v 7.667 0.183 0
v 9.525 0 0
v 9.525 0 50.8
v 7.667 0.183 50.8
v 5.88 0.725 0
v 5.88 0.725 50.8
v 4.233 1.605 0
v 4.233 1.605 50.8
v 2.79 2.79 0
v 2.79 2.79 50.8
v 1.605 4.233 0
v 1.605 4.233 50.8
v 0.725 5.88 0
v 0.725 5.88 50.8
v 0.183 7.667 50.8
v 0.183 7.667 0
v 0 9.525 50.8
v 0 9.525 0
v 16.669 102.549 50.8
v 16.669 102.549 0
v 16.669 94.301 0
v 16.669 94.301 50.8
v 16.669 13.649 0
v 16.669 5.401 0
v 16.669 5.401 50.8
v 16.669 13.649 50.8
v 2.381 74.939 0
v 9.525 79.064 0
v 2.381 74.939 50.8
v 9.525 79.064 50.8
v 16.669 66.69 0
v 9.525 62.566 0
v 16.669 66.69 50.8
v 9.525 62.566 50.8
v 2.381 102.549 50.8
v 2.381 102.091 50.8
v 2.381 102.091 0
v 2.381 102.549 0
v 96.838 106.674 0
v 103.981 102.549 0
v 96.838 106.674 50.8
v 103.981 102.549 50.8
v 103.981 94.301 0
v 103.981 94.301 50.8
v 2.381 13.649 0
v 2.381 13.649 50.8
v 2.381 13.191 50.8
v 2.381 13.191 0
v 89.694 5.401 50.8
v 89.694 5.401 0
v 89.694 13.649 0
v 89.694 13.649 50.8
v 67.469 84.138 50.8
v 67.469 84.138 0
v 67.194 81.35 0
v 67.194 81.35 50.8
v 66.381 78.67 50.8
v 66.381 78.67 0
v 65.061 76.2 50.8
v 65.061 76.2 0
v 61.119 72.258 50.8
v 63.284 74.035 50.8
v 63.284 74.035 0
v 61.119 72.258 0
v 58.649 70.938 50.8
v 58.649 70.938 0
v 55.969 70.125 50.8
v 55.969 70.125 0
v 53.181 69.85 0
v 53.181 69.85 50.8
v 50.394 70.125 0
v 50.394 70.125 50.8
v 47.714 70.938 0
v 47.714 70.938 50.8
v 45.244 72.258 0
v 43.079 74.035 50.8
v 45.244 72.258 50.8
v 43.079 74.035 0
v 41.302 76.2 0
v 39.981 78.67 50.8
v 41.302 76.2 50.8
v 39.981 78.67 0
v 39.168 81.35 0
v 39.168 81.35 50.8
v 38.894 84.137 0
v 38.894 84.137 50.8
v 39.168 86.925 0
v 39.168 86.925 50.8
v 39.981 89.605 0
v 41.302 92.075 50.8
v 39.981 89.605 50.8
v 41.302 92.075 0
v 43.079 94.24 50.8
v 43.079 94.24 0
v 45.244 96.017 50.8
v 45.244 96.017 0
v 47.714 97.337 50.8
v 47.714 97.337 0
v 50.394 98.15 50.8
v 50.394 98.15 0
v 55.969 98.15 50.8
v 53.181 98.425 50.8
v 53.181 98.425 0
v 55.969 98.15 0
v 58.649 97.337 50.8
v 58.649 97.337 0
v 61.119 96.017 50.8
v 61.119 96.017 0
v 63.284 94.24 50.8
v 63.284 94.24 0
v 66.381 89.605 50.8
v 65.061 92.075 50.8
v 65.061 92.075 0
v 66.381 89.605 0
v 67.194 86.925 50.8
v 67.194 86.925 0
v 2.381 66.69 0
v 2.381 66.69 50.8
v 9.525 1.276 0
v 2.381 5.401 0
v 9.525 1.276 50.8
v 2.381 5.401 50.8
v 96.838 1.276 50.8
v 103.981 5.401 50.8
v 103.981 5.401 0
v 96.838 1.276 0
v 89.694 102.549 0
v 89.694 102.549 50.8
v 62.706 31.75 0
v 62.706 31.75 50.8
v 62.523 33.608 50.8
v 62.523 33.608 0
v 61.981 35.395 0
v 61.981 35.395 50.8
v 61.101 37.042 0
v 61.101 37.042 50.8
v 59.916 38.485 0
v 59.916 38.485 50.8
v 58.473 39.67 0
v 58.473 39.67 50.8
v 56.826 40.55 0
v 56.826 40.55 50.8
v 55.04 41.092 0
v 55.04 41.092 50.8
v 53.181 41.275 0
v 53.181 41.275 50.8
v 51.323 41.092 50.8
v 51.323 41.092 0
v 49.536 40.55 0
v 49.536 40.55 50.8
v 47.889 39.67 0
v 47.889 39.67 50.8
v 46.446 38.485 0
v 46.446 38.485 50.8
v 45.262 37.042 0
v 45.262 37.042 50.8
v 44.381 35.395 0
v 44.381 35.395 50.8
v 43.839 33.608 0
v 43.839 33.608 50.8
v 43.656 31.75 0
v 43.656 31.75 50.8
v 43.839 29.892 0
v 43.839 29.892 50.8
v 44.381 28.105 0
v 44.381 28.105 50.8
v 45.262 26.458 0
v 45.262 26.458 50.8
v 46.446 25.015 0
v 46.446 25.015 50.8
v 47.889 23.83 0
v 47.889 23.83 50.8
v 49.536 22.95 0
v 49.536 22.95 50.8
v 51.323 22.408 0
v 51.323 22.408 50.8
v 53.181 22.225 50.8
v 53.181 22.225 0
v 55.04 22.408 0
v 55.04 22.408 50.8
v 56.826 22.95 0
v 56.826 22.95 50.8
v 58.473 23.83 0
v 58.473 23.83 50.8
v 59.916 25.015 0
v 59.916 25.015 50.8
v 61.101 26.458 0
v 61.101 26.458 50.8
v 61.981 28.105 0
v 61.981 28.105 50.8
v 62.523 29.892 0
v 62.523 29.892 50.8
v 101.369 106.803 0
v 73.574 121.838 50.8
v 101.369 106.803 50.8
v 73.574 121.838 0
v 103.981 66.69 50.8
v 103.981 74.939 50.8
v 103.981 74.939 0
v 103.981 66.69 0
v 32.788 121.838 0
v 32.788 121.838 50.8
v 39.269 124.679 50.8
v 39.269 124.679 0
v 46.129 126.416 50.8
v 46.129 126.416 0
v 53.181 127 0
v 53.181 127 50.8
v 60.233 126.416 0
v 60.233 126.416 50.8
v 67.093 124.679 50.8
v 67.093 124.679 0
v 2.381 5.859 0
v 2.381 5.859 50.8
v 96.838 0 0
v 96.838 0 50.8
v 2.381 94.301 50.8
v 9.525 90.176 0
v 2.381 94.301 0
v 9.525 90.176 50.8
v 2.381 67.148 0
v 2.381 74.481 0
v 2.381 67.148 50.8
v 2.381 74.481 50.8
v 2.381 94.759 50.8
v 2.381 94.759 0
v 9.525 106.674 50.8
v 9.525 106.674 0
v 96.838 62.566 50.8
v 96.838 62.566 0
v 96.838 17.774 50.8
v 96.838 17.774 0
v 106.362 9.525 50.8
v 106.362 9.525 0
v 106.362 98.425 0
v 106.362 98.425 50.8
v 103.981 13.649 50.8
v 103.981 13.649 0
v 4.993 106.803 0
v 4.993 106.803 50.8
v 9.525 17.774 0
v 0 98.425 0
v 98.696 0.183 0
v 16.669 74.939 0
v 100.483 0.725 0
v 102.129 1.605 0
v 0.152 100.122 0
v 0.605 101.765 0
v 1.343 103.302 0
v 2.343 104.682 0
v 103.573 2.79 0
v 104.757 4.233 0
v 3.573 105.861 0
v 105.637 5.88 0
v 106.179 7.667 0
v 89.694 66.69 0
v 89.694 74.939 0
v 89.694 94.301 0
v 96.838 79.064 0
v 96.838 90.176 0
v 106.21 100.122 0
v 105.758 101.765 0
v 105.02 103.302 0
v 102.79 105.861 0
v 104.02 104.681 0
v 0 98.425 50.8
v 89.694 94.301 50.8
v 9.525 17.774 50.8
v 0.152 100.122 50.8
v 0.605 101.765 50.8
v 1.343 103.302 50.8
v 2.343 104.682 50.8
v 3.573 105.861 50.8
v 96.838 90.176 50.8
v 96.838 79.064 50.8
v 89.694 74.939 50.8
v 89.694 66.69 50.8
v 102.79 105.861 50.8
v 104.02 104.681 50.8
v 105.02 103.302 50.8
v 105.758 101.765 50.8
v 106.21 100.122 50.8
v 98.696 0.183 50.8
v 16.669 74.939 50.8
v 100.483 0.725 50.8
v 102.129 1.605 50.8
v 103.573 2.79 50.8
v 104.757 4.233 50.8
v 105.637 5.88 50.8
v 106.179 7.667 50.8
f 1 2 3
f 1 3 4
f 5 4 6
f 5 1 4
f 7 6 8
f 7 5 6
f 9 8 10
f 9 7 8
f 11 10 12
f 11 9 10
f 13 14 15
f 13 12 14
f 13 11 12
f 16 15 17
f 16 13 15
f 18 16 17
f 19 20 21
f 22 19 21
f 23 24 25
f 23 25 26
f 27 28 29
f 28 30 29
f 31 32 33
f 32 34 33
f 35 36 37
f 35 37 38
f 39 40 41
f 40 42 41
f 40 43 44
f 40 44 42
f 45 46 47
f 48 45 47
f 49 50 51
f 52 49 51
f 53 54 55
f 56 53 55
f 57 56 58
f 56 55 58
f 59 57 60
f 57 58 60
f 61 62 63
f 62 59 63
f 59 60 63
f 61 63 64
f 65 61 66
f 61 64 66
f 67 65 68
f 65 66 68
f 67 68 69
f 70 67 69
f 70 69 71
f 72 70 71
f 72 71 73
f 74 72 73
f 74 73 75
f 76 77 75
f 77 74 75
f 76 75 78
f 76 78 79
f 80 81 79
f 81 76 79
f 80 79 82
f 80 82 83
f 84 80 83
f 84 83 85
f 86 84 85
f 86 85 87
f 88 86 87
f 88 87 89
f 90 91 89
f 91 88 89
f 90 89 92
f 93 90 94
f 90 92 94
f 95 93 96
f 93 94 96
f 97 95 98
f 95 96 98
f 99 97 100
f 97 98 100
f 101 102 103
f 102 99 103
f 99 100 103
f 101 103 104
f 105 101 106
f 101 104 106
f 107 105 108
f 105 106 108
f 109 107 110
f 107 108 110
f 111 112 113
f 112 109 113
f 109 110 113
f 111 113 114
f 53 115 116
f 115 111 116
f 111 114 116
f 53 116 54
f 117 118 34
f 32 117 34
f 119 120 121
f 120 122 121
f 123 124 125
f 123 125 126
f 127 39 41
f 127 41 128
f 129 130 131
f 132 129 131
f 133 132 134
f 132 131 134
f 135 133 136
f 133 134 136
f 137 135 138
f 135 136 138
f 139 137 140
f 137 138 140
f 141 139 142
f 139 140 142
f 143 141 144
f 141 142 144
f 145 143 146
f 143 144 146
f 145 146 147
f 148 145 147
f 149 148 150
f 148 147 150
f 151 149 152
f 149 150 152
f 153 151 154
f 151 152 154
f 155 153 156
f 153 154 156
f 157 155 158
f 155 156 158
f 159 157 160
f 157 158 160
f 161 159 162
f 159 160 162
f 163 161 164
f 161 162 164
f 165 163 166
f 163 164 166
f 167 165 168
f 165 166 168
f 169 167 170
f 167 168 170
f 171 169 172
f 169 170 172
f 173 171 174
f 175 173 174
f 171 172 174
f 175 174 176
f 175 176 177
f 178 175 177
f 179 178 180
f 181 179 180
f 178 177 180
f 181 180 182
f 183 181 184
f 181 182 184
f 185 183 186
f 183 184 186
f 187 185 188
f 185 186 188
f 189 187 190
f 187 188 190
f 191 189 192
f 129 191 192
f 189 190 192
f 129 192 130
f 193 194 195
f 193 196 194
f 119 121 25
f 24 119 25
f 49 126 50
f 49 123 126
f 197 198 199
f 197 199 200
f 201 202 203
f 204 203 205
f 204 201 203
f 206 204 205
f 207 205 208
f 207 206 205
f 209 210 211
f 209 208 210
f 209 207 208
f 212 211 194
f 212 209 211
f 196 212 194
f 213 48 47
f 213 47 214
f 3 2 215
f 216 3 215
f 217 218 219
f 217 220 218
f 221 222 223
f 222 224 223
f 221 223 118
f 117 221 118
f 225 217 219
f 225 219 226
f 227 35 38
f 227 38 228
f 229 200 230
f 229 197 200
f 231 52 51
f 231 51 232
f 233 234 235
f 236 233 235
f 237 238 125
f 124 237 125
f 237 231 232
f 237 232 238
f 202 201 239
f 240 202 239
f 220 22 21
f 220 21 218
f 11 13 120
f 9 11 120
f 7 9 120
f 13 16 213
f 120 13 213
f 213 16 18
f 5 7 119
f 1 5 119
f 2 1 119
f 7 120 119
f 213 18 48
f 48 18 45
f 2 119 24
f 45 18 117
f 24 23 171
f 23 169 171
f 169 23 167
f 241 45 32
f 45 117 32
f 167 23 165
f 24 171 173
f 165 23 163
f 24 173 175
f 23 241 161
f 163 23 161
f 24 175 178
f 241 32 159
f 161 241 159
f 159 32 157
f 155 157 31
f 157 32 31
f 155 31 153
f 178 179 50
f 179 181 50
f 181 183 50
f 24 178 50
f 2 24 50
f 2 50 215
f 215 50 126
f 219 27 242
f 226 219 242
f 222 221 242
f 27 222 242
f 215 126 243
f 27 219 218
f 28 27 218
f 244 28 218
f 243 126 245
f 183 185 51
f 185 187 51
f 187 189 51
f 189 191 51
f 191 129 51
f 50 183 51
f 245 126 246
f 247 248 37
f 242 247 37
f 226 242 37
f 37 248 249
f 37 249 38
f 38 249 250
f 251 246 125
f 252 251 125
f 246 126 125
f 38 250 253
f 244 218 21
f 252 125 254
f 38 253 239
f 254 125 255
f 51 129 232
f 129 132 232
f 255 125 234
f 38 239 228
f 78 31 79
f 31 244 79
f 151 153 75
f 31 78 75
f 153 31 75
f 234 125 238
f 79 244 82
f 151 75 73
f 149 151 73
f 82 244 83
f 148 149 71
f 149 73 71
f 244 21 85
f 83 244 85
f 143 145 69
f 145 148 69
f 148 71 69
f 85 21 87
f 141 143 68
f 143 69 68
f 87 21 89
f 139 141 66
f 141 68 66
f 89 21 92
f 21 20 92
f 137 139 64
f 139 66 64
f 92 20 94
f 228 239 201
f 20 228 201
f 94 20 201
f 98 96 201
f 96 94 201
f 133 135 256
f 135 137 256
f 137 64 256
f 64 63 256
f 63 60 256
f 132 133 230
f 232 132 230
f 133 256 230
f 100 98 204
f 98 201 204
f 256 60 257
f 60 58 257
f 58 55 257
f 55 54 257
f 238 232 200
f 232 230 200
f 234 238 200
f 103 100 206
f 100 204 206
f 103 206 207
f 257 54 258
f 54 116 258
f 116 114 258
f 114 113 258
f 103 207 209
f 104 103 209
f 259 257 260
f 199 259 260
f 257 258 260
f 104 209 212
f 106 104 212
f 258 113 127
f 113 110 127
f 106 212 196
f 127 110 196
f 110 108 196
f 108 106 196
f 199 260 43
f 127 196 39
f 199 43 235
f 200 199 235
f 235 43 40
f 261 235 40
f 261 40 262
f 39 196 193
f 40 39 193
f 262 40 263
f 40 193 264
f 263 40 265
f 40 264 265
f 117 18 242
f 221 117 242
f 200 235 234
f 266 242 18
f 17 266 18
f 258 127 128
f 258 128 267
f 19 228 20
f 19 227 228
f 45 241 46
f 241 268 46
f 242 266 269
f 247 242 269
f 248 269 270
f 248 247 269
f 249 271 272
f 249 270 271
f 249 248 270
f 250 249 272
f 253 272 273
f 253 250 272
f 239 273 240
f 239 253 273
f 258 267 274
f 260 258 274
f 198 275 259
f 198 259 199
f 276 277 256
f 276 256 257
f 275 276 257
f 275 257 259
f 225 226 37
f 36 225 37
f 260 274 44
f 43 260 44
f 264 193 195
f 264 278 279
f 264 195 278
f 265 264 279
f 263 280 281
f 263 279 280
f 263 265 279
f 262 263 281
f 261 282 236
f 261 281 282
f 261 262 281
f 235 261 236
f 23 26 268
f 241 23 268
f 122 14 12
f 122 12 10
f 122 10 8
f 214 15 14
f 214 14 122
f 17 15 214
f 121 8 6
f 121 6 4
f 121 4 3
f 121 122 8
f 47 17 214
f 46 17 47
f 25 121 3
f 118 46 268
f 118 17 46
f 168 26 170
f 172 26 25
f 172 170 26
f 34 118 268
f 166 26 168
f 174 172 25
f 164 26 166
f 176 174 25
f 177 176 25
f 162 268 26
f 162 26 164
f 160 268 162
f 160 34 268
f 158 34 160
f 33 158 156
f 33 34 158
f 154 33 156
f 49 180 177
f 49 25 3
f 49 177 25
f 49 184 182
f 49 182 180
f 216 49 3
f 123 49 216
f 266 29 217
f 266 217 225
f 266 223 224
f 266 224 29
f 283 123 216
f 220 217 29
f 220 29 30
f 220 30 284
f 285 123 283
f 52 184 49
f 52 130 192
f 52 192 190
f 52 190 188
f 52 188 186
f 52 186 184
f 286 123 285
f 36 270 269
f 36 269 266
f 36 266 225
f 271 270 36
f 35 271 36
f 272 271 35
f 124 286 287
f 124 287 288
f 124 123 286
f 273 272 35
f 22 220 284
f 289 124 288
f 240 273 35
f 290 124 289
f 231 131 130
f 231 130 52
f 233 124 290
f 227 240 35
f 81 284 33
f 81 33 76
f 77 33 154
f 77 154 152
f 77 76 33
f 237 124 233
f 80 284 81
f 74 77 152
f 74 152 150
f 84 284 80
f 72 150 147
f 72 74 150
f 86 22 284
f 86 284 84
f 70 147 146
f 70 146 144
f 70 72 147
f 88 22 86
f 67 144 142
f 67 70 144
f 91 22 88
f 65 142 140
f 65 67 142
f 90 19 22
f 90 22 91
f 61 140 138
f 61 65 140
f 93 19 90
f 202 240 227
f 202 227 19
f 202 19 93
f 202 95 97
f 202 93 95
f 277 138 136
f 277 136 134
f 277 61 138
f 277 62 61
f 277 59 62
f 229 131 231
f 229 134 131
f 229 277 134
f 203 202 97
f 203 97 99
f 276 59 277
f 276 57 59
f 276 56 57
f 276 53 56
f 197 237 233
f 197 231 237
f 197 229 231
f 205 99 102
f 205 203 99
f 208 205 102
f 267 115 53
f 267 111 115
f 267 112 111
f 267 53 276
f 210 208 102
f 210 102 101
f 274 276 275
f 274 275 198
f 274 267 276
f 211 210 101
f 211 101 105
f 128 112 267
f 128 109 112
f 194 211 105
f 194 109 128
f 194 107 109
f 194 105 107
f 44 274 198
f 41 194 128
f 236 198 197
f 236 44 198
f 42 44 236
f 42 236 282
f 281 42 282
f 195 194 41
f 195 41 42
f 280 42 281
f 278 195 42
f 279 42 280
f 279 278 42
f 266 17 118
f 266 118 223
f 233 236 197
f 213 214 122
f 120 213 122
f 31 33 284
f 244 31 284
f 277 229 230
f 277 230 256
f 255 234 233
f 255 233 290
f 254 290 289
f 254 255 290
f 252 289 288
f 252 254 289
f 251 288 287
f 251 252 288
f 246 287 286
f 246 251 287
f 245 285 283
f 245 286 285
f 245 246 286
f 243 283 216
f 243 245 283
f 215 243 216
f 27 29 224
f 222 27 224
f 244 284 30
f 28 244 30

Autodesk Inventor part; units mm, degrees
ref_plane "YZ Plane" through (0, 0, 0) normal (1, 0, 0) x (0, 1, 0)
ref_plane "XZ Plane" through (0, 0, 0) normal (0, 1, 0) x (-1, 0, 0)
ref_plane "XY Plane" through (0, 0, 0) normal (0, 0, 1) x (1, 0, 0)
sketch "Sketch1" plane through (0, 0, 0) normal (0, 0, 1) x (1, 0, 0)
  line L0 (9.525, 0) -> (96.8375, 0)
  arc A0 (0, 9.525) -> (9.525, 0) centre (9.525, 9.525) ccw
  arc A1 (96.8375, 0) -> (106.3625, 9.525) centre (96.8375, 9.525) ccw
  arc A2 (106.3625, 98.425) -> (101.3693, 106.8029) centre (96.8375, 98.425) ccw
  circle A3 centre (53.1813, 84.1375) radius 14.2875
  line L1 (32.7882, 121.8379) -> (4.9932, 106.8029)
  line L2 (73.5743, 121.8379) -> (101.3693, 106.8029)
  line L3 (0, 98.425) -> (0, 9.525)
  line L4 (106.3625, 9.525) -> (106.3625, 98.425)
  arc A4 (73.5743, 121.8379) -> (32.7882, 121.8379) centre (53.1813, 84.1375) ccw
  arc A5 (4.9932, 106.8029) -> (0, 98.425) centre (9.525, 98.425) ccw
  point P0 (0, 0)
extrude "Extrusion1" add sketch "Sketch1" along normal blind 50.8
sketch "Sketch2" plane through (0, 0, 50.8) normal (0, 0, 1) x (1, 0, 0)
  arc A0 (0, 9.525) -> (9.525, 0) centre (9.525, 9.525) ccw projected
  arc A1 (96.8375, 0) -> (106.3625, 9.525) centre (96.8375, 9.525) ccw projected
  line L0 (96.8375, 0) -> (96.8375, 9.525)
  arc A2 (106.3625, 98.425) -> (101.3693, 106.8029) centre (96.8375, 98.425) ccw projected
  line L1 (106.3625, 98.425) -> (96.8375, 98.425)
  arc A3 (4.9932, 106.8029) -> (0, 98.425) centre (9.525, 98.425) ccw projected
  line L2 (9.525, 90.1761) -> (9.525, 79.0636)
  line L3 (2.3813, 94.7588) -> (2.3812, 102.0912)
  line L4 (9.525, 84.6199) -> (12.0788, 84.6199)
  line L5 (0, 9.525) -> (0, 53.975)
  line L6 (0, 53.975) -> (101.6, 53.975)
  circle A4 centre (53.1813, 84.1375) radius 14.2875 projected
  line L7 (53.1813, 84.1375) -> (53.1813, -32.9596)
  line L8 (9.525, 98.425) -> (2.3813, 98.425)
  line L9 (2.3813, 102.5494) -> (9.525, 106.6739)
  line L10 (9.525, 106.6739) -> (16.6687, 102.5494)
  line L11 (16.6687, 102.5494) -> (16.6687, 94.3006)
  line L12 (16.6687, 94.3006) -> (9.525, 90.1761)
  line L13 (9.525, 90.1761) -> (2.3813, 94.3006)
  line L14 (2.3813, 94.3006) -> (2.3813, 102.5494)
  line L15 (2.3813, 74.4809) -> (2.3812, 67.1485)
  line L16 (9.525, 70.8147) -> (2.3813, 70.8147)
  line L17 (2.3813, 66.6903) -> (9.525, 62.5658)
  line L18 (9.525, 62.5658) -> (16.6687, 66.6903)
  line L19 (16.6687, 66.6903) -> (16.6687, 74.9392)
  line L20 (16.6687, 74.9392) -> (9.525, 79.0636)
  line L21 (9.525, 79.0636) -> (2.3813, 74.9392)
  line L22 (2.3813, 74.9392) -> (2.3813, 66.6903)
  arc A5 (0, 9.525) -> (4.9932, 1.1471) centre (9.525, 9.525) ccw
  line L23 (2.3813, 13.1912) -> (2.3812, 5.8588)
  line L24 (9.525, 9.525) -> (2.3813, 9.525)
  line L25 (2.3813, 5.4006) -> (9.525, 1.2761)
  line L26 (9.525, 1.2761) -> (16.6687, 5.4006)
  line L27 (16.6687, 5.4006) -> (16.6687, 13.6494)
  line L28 (16.6687, 13.6494) -> (9.525, 17.7739)
  line L29 (9.525, 17.7739) -> (2.3813, 13.6494)
  line L30 (2.3813, 13.6494) -> (2.3813, 5.4006)
  line L31 (96.8375, 90.1761) -> (96.8375, 79.0636)
  line L32 (103.9813, 94.7588) -> (103.9813, 102.0912)
  line L33 (96.8375, 84.6199) -> (94.2837, 84.6199)
  line L34 (96.8375, 98.425) -> (103.9813, 98.425)
  line L35 (103.9813, 102.5494) -> (96.8375, 106.6739)
  line L36 (96.8375, 106.6739) -> (89.6938, 102.5494)
  line L37 (89.6938, 102.5494) -> (89.6938, 94.3006)
  line L38 (89.6938, 94.3006) -> (96.8375, 90.1761)
  line L39 (96.8375, 90.1761) -> (103.9813, 94.3006)
  line L40 (103.9813, 94.3006) -> (103.9813, 102.5494)
  line L41 (89.6938, 66.6903) -> (89.6938, 74.9392)
  line L42 (96.8375, 62.5658) -> (89.6938, 66.6903)
  line L43 (89.6938, 74.9392) -> (96.8375, 79.0636)
  line L44 (96.8375, 70.8147) -> (103.9813, 70.8147)
  line L45 (103.9813, 74.4809) -> (103.9813, 67.1485)
  line L46 (96.8375, 79.0636) -> (103.9813, 74.9392)
  line L47 (103.9813, 74.9392) -> (103.9813, 66.6903)
  line L48 (103.9813, 66.6903) -> (96.8375, 62.5658)
  line L49 (96.8375, 1.2761) -> (89.6938, 5.4006)
  line L50 (89.6938, 5.4006) -> (89.6938, 13.6494)
  line L51 (89.6938, 13.6494) -> (96.8375, 17.7739)
  line L52 (96.8375, 17.7739) -> (103.9813, 13.6494)
  line L53 (96.8375, 9.525) -> (103.9813, 9.525)
  line L54 (103.9813, 5.4006) -> (96.8375, 1.2761)
  line L55 (103.9813, 13.1912) -> (103.9813, 5.8588)
  arc A6 (101.3693, 1.1471) -> (106.3625, 9.525) centre (96.8375, 9.525) ccw
  line L56 (103.9813, 13.6494) -> (103.9813, 5.4006)
  point P0 (0, 0)
  point P1 (96.8375, 9.525)
  point P2 (96.8375, 98.425)
  point P3 (96.8375, 9.525)
  dimension "d15" = 11.1125
extrude "Extrusion2" cut sketch "Sketch2" against normal through all contours L49 L50 L51 L52 L56 L55 L53 L0 | L0 L53 L55 L56 L54 | L20 L19 L18 L17 L22 L15 L21 | L13 L14 L3 L9 L10 L11 L12 | L30 L29 L28 L27 L26 L25 L23 | L46 L47 L45 L48 L42 L41 L43 | L38 L37 L36 L35 L40 L32 L39
sketch "Sketch3" plane through (0, 0, 50.8) normal (0, 0, 1) x (1, 0, 0)
  circle A0 centre (53.1813, 31.75) radius 9.525
  circle A1 centre (53.1813, 84.1375) radius 14.2875 projected
  line L0 (53.1813, 69.85) -> (53.1813, 31.75)
  point P0 (0, 0)
  dimension "d25" = 19.05
  dimension "d27" = 38.1
extrude "Extrusion3" cut sketch "Sketch3" against normal through all contours A0
properties part number "Transmission box"
